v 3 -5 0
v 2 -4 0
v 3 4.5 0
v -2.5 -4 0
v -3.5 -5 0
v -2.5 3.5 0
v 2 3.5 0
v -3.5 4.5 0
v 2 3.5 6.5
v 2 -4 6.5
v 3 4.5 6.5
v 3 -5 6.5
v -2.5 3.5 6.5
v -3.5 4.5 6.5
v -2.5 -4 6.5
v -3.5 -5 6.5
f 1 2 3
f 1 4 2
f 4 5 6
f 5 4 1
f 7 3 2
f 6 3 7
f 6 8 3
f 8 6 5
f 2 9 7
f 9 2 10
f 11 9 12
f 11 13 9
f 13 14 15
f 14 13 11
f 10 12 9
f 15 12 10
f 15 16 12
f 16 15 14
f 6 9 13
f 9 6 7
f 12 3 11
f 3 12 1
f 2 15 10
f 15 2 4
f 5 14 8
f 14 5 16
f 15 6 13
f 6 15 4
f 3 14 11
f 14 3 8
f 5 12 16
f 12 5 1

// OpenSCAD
echo(version=version());
$fn = 500;
// This is a simple "moat" to go around a Vl53L1X sensor for potting
color("yellow")
    linear_extrude(6.5,false)
        translate([2, -4])
            square([1,7.5]);

color("red")
    linear_extrude(6.5,false)
        translate([-3.5, -4])
            square([1,7.5]);
            
color("green")
    linear_extrude(6.5,false)
        translate([-3.5,3.5])
            square([6.5,1]);
            

color("purple")
    linear_extrude(6.5,false)
        translate([-3.5,-5])
            square([6.5,1]);



// Written in 2015 by Torsten Paul <Torsten.Paul@gmx.de>
//
// To the extent possible under law, the author(s) have dedicated all
// copyright and related and neighboring rights to this software to the
// public domain worldwide. This software is distributed without any
// warranty.
//
// You should have received a copy of the CC0 Public Domain
// Dedication along with this software.
// If not, see <http://creativecommons.org/publicdomain/zero/1.0/>.
